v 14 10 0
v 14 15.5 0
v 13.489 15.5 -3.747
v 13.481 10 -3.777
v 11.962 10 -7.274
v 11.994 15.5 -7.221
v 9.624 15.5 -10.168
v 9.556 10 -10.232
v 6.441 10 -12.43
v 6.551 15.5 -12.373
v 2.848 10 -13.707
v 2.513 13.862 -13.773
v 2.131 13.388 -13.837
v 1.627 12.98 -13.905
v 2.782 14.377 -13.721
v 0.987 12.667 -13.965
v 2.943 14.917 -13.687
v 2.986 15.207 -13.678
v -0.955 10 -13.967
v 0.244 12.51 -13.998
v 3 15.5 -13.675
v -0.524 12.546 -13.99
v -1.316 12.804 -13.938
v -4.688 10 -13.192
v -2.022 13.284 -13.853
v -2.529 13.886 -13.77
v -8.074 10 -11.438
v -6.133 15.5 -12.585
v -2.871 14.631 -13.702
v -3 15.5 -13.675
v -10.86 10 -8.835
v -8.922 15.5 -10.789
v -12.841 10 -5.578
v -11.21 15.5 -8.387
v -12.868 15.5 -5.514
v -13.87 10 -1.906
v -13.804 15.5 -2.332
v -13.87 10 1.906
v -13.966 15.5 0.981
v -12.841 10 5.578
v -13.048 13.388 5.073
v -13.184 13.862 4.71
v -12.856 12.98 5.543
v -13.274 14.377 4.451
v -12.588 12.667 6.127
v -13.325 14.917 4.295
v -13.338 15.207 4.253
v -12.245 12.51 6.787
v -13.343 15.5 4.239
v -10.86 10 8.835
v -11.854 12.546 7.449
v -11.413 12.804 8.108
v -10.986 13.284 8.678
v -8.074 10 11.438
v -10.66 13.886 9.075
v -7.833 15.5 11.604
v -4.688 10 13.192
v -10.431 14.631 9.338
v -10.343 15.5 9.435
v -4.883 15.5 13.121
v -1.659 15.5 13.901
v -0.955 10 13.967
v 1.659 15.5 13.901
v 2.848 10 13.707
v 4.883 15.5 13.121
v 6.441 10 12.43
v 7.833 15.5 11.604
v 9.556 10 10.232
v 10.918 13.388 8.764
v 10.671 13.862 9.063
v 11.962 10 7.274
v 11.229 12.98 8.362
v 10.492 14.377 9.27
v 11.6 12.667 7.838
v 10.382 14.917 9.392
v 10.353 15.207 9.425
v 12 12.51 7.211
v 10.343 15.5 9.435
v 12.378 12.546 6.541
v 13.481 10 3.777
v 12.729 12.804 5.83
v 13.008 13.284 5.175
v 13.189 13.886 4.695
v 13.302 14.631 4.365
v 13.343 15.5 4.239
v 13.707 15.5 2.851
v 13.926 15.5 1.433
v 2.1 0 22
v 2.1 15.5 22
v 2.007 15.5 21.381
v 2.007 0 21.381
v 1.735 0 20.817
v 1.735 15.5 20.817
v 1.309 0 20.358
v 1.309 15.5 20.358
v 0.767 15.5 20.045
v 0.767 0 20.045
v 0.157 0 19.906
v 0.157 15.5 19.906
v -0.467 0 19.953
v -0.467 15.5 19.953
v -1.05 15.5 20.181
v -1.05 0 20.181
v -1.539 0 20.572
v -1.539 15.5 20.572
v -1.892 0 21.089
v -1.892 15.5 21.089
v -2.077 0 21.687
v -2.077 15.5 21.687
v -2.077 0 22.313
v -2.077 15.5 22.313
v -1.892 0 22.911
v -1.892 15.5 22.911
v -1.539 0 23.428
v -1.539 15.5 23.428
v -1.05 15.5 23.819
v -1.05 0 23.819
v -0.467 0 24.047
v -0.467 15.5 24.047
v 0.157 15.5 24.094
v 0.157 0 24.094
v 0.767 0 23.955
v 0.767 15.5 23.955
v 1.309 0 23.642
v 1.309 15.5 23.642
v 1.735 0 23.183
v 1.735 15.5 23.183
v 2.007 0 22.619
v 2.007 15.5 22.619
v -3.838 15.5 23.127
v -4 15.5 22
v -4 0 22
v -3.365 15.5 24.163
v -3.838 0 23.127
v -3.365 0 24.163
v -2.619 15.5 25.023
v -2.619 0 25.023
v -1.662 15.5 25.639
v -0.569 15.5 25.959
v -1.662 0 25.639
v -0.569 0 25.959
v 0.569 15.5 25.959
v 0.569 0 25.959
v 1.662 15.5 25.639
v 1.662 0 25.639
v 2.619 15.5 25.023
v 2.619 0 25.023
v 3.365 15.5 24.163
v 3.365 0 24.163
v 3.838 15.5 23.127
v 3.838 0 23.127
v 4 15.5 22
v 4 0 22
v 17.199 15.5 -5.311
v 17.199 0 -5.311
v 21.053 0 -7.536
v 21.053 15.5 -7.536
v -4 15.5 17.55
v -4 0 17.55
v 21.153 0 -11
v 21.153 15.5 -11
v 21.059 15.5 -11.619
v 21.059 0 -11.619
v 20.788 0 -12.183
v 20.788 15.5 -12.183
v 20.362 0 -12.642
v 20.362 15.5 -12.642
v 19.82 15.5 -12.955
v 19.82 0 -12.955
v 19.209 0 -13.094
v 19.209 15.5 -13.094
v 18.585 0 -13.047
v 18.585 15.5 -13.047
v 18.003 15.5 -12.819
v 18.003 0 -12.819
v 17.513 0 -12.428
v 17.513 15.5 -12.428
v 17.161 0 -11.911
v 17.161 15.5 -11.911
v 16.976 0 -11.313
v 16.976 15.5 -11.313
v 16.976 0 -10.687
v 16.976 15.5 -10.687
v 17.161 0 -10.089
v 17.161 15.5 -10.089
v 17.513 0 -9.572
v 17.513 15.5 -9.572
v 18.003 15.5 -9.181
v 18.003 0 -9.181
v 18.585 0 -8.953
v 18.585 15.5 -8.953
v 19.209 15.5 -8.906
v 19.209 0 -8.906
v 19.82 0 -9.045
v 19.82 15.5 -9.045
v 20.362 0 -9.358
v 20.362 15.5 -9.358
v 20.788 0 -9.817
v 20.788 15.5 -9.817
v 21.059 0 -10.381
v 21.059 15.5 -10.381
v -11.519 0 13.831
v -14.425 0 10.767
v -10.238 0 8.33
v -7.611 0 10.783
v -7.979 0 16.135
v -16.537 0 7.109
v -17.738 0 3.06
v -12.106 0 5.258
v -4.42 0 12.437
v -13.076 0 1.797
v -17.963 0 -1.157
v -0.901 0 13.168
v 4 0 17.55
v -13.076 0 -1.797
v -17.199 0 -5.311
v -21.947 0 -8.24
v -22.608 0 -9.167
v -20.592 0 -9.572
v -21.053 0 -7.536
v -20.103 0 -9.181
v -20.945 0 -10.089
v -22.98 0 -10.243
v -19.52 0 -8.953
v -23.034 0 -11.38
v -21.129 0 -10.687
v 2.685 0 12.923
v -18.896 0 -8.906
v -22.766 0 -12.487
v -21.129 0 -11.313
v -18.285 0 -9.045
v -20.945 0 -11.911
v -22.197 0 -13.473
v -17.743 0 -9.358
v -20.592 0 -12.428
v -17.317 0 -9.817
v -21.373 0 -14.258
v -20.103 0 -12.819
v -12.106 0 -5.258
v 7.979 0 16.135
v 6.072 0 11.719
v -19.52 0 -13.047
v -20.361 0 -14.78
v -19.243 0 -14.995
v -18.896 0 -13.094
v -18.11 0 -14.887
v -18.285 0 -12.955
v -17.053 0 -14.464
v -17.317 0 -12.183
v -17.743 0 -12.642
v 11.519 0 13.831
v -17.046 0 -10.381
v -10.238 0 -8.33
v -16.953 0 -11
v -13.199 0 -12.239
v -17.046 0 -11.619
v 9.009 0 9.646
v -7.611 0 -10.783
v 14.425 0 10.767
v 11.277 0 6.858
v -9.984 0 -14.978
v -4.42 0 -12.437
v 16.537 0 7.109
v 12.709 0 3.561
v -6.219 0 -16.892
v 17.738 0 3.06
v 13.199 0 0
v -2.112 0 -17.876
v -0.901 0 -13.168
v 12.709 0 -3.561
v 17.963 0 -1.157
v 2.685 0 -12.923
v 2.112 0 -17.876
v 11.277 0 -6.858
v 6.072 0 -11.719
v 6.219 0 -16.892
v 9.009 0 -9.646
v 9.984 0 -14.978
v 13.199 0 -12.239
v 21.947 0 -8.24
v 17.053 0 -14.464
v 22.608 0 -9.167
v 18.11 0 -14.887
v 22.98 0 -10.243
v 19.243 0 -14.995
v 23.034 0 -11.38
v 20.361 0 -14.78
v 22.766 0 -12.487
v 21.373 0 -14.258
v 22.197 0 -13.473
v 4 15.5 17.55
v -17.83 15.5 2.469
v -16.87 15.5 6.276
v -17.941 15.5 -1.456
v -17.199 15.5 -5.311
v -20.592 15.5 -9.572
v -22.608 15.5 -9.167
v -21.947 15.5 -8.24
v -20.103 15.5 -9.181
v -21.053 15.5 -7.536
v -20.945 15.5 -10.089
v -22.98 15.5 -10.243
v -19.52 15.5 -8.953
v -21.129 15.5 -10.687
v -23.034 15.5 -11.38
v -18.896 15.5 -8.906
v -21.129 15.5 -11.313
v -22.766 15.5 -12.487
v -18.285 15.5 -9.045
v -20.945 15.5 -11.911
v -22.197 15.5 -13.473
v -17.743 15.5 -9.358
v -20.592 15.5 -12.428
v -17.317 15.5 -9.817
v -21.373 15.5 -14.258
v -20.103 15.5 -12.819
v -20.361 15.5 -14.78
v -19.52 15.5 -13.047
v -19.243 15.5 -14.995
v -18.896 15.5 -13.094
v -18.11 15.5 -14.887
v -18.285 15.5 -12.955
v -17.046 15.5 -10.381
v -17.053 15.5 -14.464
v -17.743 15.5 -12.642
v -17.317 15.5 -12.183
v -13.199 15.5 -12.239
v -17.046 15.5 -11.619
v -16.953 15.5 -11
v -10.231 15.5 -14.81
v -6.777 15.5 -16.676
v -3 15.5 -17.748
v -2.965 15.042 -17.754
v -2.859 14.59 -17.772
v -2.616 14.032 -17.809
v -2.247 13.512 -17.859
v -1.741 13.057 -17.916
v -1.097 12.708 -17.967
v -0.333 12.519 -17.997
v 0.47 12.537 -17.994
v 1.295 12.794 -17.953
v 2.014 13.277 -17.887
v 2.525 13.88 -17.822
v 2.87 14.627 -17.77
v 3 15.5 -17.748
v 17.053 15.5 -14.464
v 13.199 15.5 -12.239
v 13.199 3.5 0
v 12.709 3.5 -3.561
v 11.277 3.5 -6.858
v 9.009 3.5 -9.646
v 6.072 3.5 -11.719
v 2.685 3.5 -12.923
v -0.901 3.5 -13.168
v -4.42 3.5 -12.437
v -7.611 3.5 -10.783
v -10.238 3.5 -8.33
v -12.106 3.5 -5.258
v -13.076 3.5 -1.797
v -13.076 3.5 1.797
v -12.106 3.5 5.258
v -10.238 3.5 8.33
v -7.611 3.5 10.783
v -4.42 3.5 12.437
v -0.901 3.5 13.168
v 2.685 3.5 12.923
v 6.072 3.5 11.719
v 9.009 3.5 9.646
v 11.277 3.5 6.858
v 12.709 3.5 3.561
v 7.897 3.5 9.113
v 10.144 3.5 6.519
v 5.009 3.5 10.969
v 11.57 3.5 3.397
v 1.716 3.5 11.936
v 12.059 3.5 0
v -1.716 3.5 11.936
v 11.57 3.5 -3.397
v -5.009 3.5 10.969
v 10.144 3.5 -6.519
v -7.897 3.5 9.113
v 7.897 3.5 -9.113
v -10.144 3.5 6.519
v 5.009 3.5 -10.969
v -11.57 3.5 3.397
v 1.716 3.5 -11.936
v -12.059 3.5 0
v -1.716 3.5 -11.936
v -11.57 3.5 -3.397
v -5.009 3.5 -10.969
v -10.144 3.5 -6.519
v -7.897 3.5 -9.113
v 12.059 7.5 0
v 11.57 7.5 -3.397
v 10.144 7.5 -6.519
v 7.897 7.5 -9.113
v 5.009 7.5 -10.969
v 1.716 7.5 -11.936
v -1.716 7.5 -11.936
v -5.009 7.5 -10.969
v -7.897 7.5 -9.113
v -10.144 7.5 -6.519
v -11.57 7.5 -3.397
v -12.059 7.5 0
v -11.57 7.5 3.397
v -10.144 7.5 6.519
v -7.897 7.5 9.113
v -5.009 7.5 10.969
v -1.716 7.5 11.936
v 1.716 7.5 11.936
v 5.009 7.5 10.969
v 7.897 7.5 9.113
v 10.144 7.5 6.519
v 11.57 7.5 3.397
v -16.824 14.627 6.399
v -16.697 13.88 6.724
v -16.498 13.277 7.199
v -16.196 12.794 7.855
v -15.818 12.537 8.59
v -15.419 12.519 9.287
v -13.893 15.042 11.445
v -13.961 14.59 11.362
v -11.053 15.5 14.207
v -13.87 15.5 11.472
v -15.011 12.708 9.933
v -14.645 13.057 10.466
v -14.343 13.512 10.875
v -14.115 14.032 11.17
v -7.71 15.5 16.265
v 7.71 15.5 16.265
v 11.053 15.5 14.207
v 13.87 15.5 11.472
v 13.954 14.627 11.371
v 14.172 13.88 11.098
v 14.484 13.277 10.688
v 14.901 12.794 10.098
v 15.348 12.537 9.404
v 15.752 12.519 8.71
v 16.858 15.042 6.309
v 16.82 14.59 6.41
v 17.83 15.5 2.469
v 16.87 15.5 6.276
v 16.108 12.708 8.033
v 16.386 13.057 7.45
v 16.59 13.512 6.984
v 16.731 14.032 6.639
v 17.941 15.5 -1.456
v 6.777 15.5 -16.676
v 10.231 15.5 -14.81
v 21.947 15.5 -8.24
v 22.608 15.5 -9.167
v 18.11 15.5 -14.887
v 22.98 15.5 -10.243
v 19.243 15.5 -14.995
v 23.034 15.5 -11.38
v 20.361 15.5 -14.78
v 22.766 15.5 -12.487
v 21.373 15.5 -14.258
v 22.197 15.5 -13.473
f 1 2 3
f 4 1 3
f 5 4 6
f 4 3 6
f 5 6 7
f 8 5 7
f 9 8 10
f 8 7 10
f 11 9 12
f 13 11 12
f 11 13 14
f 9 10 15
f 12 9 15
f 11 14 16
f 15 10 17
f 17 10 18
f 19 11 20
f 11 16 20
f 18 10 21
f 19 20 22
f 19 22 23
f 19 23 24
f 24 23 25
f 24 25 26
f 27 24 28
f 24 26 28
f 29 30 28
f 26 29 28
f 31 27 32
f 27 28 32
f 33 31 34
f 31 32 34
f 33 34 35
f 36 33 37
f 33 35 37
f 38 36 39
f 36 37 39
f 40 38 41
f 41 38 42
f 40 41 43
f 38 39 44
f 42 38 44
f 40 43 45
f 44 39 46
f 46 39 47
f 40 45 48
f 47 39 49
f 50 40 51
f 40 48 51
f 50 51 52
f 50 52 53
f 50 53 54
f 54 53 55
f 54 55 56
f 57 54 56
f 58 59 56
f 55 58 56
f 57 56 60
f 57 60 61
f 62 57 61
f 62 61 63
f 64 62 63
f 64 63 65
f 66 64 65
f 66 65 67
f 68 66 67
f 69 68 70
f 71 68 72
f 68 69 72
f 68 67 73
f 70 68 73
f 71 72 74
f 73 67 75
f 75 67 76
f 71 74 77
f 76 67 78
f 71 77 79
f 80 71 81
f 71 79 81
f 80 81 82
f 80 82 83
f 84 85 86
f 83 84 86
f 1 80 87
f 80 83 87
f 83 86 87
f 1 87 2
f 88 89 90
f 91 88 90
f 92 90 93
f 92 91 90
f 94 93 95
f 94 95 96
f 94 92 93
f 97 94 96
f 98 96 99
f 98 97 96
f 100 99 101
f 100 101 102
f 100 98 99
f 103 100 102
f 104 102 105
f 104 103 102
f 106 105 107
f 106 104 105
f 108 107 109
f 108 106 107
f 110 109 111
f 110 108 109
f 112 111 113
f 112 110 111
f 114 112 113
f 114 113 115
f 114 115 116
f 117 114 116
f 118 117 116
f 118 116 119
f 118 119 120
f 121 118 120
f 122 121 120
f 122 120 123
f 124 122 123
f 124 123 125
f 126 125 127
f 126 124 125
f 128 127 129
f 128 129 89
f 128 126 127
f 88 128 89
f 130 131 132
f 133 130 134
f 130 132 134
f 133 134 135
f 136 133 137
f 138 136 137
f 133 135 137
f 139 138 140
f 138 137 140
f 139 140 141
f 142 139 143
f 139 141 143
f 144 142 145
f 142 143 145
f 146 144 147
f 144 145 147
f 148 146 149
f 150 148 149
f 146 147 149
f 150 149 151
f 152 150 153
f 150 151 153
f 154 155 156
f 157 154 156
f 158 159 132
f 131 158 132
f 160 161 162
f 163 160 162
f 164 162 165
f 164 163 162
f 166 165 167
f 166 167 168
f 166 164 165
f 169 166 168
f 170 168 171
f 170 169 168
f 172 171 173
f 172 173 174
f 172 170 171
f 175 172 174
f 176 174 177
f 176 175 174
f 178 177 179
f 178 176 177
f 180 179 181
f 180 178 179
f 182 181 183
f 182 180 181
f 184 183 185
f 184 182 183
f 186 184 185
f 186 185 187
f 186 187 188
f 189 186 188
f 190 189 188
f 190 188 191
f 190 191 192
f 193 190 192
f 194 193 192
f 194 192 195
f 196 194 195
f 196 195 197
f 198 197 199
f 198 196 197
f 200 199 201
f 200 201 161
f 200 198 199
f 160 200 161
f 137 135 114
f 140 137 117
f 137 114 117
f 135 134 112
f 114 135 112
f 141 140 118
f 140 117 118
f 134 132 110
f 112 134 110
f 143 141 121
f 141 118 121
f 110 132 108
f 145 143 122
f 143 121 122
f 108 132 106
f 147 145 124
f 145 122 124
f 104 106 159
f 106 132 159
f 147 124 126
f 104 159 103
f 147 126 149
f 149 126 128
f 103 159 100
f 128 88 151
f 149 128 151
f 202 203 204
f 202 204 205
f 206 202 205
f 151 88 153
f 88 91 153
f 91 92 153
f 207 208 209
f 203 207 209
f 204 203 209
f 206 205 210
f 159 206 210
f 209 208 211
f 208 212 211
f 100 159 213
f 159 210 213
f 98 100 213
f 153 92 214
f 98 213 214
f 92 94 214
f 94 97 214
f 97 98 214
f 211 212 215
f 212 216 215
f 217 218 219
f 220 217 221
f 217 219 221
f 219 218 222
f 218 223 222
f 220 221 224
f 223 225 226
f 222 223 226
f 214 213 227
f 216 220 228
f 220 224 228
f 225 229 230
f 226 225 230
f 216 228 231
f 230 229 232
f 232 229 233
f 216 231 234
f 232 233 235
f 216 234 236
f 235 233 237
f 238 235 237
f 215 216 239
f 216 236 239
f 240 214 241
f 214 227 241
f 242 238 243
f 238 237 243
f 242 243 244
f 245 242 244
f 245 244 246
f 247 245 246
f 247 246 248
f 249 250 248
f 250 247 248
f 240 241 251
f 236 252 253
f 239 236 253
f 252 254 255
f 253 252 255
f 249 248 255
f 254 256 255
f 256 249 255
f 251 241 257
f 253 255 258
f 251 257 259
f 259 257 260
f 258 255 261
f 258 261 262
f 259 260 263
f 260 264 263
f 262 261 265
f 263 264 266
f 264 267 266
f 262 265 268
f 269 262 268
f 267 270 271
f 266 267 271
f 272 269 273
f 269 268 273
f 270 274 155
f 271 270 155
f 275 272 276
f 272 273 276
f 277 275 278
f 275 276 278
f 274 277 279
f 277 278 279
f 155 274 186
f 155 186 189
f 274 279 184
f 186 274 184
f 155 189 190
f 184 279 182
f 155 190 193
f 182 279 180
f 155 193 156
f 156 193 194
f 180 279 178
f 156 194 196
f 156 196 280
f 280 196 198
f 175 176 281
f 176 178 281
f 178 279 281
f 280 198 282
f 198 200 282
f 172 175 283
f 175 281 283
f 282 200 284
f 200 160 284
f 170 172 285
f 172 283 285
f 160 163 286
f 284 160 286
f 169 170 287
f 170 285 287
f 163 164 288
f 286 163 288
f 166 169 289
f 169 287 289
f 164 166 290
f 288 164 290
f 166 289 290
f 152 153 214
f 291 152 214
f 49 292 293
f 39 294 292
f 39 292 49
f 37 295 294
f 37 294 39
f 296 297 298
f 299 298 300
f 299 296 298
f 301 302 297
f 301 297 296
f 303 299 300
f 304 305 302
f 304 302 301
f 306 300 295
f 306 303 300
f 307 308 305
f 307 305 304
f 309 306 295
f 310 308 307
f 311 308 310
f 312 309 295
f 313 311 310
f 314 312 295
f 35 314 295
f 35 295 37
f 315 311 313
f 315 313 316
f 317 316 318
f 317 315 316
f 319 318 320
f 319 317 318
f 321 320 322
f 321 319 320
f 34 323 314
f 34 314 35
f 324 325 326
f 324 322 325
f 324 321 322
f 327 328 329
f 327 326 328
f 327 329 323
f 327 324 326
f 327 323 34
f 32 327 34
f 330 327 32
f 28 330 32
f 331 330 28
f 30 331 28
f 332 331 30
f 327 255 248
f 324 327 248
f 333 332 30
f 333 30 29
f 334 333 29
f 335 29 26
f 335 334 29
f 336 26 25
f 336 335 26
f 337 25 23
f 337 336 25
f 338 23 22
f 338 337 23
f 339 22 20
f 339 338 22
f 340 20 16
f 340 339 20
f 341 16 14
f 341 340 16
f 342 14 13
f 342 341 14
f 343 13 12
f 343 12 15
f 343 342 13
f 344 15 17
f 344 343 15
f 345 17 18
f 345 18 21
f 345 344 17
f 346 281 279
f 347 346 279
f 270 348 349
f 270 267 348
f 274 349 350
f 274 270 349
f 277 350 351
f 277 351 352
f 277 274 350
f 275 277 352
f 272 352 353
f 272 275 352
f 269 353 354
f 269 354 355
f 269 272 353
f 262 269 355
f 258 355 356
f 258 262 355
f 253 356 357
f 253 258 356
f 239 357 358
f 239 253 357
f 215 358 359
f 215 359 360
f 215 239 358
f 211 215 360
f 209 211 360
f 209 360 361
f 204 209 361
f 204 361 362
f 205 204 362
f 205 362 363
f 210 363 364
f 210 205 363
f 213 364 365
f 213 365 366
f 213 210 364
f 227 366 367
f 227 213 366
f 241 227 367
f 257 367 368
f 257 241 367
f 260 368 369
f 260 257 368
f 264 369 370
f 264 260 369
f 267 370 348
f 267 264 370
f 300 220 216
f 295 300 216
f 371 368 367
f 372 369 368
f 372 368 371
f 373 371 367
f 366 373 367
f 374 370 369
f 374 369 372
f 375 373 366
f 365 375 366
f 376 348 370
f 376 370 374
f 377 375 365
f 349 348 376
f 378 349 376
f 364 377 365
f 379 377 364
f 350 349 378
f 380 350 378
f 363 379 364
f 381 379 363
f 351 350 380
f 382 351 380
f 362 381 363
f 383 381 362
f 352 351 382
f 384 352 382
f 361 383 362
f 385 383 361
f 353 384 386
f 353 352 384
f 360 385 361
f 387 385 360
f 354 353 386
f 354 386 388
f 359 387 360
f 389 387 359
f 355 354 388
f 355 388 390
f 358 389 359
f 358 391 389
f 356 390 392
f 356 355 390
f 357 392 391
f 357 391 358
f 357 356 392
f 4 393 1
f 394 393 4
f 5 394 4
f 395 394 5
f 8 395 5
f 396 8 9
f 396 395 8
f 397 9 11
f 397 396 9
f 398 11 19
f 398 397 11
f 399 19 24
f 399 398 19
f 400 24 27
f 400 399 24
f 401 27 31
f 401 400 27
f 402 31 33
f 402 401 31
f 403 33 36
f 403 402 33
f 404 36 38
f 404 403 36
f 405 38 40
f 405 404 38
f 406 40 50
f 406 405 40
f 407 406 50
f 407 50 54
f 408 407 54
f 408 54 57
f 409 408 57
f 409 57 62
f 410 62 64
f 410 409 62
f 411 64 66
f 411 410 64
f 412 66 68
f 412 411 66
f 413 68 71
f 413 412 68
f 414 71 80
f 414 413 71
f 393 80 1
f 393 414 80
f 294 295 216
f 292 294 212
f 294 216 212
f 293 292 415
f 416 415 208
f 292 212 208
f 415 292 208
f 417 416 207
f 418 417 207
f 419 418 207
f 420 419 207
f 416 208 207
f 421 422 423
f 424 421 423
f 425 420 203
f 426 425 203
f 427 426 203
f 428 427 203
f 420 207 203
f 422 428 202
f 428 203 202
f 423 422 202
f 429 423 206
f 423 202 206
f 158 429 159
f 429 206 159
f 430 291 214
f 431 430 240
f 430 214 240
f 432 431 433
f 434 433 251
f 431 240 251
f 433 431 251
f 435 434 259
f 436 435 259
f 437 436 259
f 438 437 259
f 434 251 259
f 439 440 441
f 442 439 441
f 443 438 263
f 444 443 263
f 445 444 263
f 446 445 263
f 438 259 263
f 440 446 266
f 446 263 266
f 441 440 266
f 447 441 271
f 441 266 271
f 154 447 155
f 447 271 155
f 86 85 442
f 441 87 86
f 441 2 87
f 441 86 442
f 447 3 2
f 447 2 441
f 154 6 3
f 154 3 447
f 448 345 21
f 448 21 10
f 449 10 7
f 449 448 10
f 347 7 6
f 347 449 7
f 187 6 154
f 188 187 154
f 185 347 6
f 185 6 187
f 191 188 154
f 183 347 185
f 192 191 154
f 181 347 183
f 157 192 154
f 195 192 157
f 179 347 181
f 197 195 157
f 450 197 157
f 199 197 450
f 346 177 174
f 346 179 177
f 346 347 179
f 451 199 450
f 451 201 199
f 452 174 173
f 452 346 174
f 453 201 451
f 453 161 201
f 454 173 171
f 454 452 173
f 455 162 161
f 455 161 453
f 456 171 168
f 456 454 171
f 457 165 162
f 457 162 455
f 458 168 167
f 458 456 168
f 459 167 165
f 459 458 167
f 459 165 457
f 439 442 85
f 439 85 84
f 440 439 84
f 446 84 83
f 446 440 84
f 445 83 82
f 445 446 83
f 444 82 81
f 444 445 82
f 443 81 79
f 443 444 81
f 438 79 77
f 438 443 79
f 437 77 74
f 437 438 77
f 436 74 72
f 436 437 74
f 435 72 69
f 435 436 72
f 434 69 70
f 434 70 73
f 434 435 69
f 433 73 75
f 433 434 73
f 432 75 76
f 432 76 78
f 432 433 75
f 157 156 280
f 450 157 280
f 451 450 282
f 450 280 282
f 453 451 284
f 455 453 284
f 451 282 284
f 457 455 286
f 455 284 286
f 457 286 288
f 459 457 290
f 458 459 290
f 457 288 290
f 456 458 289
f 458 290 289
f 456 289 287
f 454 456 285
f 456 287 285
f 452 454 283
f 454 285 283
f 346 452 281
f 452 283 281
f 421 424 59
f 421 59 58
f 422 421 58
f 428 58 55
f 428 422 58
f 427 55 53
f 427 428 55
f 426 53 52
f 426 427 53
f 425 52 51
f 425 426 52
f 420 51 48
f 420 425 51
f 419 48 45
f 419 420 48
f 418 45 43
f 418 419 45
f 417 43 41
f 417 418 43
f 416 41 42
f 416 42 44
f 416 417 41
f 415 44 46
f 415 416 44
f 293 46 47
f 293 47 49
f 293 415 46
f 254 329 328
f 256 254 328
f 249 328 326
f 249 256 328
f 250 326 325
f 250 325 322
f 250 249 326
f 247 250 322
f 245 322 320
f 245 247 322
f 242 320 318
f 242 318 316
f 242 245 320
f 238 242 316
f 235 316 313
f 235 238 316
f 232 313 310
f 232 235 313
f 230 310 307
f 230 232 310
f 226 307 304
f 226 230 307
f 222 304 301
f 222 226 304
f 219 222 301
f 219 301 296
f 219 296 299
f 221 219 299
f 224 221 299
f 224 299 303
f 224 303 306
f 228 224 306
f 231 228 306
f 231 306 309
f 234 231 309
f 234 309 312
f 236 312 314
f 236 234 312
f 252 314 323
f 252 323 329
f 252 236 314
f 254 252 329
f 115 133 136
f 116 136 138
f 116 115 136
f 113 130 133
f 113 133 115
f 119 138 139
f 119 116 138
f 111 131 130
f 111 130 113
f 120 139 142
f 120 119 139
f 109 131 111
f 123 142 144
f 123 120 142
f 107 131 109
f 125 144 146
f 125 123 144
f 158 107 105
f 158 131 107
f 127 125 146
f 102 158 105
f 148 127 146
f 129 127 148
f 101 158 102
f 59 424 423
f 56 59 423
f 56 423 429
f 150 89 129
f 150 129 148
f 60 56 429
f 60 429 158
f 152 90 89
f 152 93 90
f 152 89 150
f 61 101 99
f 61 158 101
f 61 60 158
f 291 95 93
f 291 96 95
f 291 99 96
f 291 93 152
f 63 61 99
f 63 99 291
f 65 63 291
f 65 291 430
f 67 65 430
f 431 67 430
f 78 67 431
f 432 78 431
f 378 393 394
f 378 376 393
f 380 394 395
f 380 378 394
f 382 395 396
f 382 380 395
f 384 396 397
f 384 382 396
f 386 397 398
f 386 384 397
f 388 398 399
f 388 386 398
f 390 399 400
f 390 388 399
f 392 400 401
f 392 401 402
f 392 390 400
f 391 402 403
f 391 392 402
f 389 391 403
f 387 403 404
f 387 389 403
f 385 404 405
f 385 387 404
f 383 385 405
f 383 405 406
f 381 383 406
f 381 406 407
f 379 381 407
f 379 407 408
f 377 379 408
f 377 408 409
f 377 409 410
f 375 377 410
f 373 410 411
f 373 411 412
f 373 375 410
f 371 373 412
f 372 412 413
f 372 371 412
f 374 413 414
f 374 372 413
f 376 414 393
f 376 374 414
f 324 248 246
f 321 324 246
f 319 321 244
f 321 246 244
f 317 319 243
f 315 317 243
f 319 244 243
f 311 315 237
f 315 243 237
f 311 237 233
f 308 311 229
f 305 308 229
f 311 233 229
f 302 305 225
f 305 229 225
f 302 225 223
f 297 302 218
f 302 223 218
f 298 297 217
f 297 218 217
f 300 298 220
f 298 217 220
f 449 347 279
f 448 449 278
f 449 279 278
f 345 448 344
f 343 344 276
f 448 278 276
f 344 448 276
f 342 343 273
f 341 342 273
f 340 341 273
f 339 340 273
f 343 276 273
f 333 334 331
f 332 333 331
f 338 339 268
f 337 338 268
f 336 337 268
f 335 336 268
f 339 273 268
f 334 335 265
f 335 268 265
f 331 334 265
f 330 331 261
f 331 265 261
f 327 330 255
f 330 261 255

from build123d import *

# Parameters (mm, degrees)
SKETCH1_R           = 2.1
BOSS_EXTRUDE1_DEPTH = 15.5
SKETCH2_R           = 14
CUT_EXTRUDE1_DEPTH  = 16.5
CUT_EXTRUDE2_START  = -18
SKETCH4_R           = 3
CUT_EXTRUDE2_DEPTH  = 4.325206
CIRPATTERN1_COUNT   = 3


with BuildPart() as part:
    # Sketch1 → Boss-Extrude1 (new body)
    with BuildSketch(Plane(origin=(0, 0, 0), x_dir=(1, 0, 0), z_dir=(0, 1, 0))):
        with BuildLine():
            Line((-4, -17.549928775), (-4, -22))
            ThreePointArc((-4, -22), (0, -26), (4, -22))
            Line((4, -22), (4, -17.549928775))
            ThreePointArc((4, -17.549928775), (15.588457268, -9), (17.198684154, 5.310862772))
            Line((17.198684154, 5.310862772), (21.052558883, 7.535898385))
            ThreePointArc((21.052558883, 7.535898385), (22.516660498, 13), (17.052558883, 14.464101615))
            Line((17.052558883, 14.464101615), (13.198684154, 12.239066003))
            ThreePointArc((13.198684154, 12.239066003), (0, 18), (-13.198684154, 12.239066003))
            Line((-13.198684154, 12.239066003), (-17.052558883, 14.464101615))
            ThreePointArc((-17.052558883, 14.464101615), (-22.516660498, 13), (-21.052558883, 7.535898385))
            Line((-21.052558883, 7.535898385), (-17.198684154, 5.310862772))
            ThreePointArc((-17.198684154, 5.310862772), (-15.588457268, -9), (-4, -17.549928775))
        make_face()
        with Locations((0, -22)):
            Circle(SKETCH1_R, mode=Mode.SUBTRACT)
        with Locations((-19.052558883, 11)):
            Circle(SKETCH1_R, mode=Mode.SUBTRACT)
        with Locations((19.052558883, 11)):
            Circle(SKETCH1_R, mode=Mode.SUBTRACT)
    extrude(amount=BOSS_EXTRUDE1_DEPTH)

    # Sketch2 → Cut-Extrude1 (cut, through all)
    with BuildSketch(Plane(origin=(0, 15.5, 0), x_dir=(1, 0, 0), z_dir=(0, 1, 0))):
        Circle(SKETCH2_R)
    extrude(amount=-CUT_EXTRUDE1_DEPTH, mode=Mode.SUBTRACT)

    # Sketch3 → Revolve1 (revolve)
    with BuildSketch(Plane.XY):
        Polygon((14, 10), (12.058684154, 7.5), (12.058684154, 3.5), (13.198684154, 3.5), (13.198684154, 0), (14, 0), (14.499168446, 0), (14.499168446, 10), align=None)
    revolve(axis=Axis((0, 0, 0), (0, 1, 0)))

    # Sketch4 → Cut-Extrude2 (cut)
    with BuildSketch(Plane.XY.offset(CUT_EXTRUDE2_START)):
        with Locations((0, 15.5)):
            Circle(SKETCH4_R)
    cut_extrude2 = extrude(amount=CUT_EXTRUDE2_DEPTH, mode=Mode.SUBTRACT)

    # CirPattern1: Cut-Extrude2 ×3 about axis
    cirpattern1_axis = Axis((0, 0, 0), (0, 1, 0))
    for i in range(1, CIRPATTERN1_COUNT):
        add(cut_extrude2.rotate(cirpattern1_axis, i * 360 / CIRPATTERN1_COUNT), mode=Mode.SUBTRACT)


solid = part.part
